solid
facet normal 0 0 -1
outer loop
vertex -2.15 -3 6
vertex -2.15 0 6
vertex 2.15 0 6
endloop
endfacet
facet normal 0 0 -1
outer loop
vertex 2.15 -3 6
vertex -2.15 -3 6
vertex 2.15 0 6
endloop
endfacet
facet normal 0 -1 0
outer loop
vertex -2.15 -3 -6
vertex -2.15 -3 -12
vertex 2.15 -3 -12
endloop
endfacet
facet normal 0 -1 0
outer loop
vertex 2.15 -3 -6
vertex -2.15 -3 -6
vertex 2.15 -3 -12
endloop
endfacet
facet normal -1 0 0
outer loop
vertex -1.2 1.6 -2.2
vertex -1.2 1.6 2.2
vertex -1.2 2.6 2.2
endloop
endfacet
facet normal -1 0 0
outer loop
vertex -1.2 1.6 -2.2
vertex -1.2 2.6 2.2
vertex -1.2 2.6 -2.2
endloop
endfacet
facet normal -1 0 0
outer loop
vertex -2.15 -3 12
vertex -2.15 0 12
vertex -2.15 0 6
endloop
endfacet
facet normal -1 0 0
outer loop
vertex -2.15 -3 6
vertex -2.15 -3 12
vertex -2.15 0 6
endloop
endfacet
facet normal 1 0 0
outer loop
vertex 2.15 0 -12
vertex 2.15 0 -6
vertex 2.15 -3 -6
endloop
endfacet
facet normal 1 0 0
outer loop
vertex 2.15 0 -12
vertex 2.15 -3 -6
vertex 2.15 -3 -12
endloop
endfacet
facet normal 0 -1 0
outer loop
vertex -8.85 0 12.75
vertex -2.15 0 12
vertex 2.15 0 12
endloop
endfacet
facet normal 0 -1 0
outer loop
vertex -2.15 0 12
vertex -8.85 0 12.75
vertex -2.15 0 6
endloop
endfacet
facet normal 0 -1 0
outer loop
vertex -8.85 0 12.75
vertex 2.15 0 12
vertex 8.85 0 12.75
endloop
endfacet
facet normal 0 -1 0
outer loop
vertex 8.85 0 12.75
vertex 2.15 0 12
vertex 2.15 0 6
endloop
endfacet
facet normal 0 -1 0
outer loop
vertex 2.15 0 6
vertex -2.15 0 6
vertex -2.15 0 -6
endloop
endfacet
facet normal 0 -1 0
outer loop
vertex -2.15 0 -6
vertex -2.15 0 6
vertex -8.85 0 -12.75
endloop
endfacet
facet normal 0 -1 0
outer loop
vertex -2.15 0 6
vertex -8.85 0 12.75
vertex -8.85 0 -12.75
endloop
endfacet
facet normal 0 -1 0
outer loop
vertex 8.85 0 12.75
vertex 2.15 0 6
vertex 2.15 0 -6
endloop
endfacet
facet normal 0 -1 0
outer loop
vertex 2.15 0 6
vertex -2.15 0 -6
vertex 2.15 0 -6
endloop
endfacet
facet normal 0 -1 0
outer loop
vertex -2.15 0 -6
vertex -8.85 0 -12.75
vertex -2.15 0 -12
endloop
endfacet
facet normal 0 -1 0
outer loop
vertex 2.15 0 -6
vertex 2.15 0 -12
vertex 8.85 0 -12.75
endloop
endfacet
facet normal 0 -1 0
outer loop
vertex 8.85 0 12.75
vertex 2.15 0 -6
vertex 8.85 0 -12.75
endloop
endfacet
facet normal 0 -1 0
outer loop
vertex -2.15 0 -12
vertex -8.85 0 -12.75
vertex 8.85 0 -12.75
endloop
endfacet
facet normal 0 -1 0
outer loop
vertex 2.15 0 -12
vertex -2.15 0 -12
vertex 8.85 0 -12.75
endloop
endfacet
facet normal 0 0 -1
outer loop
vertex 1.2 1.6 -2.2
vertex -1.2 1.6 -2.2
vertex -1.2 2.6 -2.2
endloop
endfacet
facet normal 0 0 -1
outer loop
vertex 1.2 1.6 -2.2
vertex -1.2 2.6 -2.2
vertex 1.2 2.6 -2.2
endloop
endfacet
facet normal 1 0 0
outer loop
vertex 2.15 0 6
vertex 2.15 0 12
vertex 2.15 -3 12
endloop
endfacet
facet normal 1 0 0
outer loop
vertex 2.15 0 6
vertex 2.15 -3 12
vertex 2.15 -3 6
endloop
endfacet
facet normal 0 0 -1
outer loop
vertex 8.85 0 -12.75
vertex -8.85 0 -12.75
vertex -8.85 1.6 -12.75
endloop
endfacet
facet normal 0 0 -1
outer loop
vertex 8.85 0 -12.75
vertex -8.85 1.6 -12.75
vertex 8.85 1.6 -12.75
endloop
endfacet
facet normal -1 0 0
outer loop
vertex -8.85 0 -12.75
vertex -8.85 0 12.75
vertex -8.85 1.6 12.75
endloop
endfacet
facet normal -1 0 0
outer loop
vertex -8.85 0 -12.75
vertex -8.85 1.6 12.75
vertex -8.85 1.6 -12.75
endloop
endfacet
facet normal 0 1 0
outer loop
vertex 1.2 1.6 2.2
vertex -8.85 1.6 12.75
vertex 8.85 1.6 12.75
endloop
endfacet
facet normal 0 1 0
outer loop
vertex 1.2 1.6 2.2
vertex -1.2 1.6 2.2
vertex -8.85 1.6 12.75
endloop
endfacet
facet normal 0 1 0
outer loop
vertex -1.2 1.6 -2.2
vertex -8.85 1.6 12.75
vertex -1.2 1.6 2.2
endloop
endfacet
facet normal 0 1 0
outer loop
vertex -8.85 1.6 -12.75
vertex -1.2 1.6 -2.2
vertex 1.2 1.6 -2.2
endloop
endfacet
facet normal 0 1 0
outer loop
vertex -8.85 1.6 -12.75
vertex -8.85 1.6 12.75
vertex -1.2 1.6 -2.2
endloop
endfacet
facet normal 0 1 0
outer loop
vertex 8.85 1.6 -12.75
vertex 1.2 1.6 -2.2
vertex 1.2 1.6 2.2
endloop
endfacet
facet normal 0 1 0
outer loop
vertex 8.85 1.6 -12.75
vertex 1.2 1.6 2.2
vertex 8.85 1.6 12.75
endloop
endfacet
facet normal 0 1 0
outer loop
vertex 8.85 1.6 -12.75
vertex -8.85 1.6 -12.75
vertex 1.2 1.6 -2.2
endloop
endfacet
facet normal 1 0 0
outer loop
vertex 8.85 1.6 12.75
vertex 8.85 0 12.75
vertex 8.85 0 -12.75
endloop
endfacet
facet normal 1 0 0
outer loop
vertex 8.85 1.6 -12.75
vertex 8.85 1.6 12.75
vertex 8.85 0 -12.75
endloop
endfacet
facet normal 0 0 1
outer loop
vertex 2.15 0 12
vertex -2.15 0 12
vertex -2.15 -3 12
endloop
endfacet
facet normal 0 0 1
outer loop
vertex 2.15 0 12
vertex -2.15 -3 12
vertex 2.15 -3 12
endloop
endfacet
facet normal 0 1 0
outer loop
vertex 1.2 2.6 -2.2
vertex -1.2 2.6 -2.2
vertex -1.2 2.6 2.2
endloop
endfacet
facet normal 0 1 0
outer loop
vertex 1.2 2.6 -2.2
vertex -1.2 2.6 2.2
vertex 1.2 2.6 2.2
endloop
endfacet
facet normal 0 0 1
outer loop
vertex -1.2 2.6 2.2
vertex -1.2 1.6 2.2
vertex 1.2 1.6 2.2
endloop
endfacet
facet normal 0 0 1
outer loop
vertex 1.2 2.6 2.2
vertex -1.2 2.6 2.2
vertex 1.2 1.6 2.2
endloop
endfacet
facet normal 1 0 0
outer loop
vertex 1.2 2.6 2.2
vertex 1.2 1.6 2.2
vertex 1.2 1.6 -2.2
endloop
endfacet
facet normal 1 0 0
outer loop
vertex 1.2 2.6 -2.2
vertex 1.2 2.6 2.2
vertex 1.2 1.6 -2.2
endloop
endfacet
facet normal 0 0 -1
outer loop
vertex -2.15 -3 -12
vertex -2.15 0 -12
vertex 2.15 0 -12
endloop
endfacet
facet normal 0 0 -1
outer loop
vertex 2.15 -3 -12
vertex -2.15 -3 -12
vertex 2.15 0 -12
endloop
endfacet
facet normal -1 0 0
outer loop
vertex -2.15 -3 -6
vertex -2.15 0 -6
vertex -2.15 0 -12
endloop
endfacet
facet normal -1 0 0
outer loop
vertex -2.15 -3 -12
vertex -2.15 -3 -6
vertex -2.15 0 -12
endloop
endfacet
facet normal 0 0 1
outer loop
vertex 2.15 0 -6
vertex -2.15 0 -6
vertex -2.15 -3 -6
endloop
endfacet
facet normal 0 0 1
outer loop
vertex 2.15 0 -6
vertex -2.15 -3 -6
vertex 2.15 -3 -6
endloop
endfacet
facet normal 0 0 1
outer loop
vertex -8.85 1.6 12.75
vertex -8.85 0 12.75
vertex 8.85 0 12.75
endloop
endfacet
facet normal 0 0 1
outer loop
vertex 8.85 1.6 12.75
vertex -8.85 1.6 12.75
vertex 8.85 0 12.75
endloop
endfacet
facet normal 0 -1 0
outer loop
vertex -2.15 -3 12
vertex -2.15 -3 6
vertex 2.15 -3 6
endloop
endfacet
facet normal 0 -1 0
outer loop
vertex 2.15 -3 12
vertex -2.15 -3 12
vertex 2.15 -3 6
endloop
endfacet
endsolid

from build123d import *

# Parameters (mm, degrees)
SK_BOARD_W              = 17.7
SK_BOARD_H              = 25.5
EX_BOARD_DEPTH          = 1.6
SK_SENSOR_W             = 2.4
SK_SENSOR_H             = 4.4
EX_SENSOR_DEPTH         = 1
SK_KEEPOUT_STEMMA_W     = 4.3
SK_KEEPOUT_STEMMA_H     = 6
EX_KEEPOUT_STEMMA_DEPTH = 3


with BuildPart() as part:
    # SK_Board → EX_Board (new body)
    with BuildSketch(Plane(origin=(0, 0, 0), x_dir=(1, 0, 0), z_dir=(0, 1, 0))):
        Rectangle(SK_BOARD_W, SK_BOARD_H)
    extrude(amount=EX_BOARD_DEPTH)

    # SK_Sensor → EX_Sensor (add)
    with BuildSketch(Plane(origin=(0, 1.6, 0), x_dir=(1, 0, 0), z_dir=(0, 1, 0))):
        Rectangle(SK_SENSOR_W, SK_SENSOR_H)
    extrude(amount=EX_SENSOR_DEPTH)

    # SK_KeepOut_STEMMA → EX_KeepOut_STEMMA (add)
    with BuildSketch(Plane(origin=(0, 0, 0), x_dir=(1, 0, 0), z_dir=(0, 1, 0))):
        with Locations((0, -9)):
            Rectangle(SK_KEEPOUT_STEMMA_W, SK_KEEPOUT_STEMMA_H)
        with Locations((0, 9)):
            Rectangle(SK_KEEPOUT_STEMMA_W, SK_KEEPOUT_STEMMA_H)
    extrude(amount=-EX_KEEPOUT_STEMMA_DEPTH)


solid = part.part
